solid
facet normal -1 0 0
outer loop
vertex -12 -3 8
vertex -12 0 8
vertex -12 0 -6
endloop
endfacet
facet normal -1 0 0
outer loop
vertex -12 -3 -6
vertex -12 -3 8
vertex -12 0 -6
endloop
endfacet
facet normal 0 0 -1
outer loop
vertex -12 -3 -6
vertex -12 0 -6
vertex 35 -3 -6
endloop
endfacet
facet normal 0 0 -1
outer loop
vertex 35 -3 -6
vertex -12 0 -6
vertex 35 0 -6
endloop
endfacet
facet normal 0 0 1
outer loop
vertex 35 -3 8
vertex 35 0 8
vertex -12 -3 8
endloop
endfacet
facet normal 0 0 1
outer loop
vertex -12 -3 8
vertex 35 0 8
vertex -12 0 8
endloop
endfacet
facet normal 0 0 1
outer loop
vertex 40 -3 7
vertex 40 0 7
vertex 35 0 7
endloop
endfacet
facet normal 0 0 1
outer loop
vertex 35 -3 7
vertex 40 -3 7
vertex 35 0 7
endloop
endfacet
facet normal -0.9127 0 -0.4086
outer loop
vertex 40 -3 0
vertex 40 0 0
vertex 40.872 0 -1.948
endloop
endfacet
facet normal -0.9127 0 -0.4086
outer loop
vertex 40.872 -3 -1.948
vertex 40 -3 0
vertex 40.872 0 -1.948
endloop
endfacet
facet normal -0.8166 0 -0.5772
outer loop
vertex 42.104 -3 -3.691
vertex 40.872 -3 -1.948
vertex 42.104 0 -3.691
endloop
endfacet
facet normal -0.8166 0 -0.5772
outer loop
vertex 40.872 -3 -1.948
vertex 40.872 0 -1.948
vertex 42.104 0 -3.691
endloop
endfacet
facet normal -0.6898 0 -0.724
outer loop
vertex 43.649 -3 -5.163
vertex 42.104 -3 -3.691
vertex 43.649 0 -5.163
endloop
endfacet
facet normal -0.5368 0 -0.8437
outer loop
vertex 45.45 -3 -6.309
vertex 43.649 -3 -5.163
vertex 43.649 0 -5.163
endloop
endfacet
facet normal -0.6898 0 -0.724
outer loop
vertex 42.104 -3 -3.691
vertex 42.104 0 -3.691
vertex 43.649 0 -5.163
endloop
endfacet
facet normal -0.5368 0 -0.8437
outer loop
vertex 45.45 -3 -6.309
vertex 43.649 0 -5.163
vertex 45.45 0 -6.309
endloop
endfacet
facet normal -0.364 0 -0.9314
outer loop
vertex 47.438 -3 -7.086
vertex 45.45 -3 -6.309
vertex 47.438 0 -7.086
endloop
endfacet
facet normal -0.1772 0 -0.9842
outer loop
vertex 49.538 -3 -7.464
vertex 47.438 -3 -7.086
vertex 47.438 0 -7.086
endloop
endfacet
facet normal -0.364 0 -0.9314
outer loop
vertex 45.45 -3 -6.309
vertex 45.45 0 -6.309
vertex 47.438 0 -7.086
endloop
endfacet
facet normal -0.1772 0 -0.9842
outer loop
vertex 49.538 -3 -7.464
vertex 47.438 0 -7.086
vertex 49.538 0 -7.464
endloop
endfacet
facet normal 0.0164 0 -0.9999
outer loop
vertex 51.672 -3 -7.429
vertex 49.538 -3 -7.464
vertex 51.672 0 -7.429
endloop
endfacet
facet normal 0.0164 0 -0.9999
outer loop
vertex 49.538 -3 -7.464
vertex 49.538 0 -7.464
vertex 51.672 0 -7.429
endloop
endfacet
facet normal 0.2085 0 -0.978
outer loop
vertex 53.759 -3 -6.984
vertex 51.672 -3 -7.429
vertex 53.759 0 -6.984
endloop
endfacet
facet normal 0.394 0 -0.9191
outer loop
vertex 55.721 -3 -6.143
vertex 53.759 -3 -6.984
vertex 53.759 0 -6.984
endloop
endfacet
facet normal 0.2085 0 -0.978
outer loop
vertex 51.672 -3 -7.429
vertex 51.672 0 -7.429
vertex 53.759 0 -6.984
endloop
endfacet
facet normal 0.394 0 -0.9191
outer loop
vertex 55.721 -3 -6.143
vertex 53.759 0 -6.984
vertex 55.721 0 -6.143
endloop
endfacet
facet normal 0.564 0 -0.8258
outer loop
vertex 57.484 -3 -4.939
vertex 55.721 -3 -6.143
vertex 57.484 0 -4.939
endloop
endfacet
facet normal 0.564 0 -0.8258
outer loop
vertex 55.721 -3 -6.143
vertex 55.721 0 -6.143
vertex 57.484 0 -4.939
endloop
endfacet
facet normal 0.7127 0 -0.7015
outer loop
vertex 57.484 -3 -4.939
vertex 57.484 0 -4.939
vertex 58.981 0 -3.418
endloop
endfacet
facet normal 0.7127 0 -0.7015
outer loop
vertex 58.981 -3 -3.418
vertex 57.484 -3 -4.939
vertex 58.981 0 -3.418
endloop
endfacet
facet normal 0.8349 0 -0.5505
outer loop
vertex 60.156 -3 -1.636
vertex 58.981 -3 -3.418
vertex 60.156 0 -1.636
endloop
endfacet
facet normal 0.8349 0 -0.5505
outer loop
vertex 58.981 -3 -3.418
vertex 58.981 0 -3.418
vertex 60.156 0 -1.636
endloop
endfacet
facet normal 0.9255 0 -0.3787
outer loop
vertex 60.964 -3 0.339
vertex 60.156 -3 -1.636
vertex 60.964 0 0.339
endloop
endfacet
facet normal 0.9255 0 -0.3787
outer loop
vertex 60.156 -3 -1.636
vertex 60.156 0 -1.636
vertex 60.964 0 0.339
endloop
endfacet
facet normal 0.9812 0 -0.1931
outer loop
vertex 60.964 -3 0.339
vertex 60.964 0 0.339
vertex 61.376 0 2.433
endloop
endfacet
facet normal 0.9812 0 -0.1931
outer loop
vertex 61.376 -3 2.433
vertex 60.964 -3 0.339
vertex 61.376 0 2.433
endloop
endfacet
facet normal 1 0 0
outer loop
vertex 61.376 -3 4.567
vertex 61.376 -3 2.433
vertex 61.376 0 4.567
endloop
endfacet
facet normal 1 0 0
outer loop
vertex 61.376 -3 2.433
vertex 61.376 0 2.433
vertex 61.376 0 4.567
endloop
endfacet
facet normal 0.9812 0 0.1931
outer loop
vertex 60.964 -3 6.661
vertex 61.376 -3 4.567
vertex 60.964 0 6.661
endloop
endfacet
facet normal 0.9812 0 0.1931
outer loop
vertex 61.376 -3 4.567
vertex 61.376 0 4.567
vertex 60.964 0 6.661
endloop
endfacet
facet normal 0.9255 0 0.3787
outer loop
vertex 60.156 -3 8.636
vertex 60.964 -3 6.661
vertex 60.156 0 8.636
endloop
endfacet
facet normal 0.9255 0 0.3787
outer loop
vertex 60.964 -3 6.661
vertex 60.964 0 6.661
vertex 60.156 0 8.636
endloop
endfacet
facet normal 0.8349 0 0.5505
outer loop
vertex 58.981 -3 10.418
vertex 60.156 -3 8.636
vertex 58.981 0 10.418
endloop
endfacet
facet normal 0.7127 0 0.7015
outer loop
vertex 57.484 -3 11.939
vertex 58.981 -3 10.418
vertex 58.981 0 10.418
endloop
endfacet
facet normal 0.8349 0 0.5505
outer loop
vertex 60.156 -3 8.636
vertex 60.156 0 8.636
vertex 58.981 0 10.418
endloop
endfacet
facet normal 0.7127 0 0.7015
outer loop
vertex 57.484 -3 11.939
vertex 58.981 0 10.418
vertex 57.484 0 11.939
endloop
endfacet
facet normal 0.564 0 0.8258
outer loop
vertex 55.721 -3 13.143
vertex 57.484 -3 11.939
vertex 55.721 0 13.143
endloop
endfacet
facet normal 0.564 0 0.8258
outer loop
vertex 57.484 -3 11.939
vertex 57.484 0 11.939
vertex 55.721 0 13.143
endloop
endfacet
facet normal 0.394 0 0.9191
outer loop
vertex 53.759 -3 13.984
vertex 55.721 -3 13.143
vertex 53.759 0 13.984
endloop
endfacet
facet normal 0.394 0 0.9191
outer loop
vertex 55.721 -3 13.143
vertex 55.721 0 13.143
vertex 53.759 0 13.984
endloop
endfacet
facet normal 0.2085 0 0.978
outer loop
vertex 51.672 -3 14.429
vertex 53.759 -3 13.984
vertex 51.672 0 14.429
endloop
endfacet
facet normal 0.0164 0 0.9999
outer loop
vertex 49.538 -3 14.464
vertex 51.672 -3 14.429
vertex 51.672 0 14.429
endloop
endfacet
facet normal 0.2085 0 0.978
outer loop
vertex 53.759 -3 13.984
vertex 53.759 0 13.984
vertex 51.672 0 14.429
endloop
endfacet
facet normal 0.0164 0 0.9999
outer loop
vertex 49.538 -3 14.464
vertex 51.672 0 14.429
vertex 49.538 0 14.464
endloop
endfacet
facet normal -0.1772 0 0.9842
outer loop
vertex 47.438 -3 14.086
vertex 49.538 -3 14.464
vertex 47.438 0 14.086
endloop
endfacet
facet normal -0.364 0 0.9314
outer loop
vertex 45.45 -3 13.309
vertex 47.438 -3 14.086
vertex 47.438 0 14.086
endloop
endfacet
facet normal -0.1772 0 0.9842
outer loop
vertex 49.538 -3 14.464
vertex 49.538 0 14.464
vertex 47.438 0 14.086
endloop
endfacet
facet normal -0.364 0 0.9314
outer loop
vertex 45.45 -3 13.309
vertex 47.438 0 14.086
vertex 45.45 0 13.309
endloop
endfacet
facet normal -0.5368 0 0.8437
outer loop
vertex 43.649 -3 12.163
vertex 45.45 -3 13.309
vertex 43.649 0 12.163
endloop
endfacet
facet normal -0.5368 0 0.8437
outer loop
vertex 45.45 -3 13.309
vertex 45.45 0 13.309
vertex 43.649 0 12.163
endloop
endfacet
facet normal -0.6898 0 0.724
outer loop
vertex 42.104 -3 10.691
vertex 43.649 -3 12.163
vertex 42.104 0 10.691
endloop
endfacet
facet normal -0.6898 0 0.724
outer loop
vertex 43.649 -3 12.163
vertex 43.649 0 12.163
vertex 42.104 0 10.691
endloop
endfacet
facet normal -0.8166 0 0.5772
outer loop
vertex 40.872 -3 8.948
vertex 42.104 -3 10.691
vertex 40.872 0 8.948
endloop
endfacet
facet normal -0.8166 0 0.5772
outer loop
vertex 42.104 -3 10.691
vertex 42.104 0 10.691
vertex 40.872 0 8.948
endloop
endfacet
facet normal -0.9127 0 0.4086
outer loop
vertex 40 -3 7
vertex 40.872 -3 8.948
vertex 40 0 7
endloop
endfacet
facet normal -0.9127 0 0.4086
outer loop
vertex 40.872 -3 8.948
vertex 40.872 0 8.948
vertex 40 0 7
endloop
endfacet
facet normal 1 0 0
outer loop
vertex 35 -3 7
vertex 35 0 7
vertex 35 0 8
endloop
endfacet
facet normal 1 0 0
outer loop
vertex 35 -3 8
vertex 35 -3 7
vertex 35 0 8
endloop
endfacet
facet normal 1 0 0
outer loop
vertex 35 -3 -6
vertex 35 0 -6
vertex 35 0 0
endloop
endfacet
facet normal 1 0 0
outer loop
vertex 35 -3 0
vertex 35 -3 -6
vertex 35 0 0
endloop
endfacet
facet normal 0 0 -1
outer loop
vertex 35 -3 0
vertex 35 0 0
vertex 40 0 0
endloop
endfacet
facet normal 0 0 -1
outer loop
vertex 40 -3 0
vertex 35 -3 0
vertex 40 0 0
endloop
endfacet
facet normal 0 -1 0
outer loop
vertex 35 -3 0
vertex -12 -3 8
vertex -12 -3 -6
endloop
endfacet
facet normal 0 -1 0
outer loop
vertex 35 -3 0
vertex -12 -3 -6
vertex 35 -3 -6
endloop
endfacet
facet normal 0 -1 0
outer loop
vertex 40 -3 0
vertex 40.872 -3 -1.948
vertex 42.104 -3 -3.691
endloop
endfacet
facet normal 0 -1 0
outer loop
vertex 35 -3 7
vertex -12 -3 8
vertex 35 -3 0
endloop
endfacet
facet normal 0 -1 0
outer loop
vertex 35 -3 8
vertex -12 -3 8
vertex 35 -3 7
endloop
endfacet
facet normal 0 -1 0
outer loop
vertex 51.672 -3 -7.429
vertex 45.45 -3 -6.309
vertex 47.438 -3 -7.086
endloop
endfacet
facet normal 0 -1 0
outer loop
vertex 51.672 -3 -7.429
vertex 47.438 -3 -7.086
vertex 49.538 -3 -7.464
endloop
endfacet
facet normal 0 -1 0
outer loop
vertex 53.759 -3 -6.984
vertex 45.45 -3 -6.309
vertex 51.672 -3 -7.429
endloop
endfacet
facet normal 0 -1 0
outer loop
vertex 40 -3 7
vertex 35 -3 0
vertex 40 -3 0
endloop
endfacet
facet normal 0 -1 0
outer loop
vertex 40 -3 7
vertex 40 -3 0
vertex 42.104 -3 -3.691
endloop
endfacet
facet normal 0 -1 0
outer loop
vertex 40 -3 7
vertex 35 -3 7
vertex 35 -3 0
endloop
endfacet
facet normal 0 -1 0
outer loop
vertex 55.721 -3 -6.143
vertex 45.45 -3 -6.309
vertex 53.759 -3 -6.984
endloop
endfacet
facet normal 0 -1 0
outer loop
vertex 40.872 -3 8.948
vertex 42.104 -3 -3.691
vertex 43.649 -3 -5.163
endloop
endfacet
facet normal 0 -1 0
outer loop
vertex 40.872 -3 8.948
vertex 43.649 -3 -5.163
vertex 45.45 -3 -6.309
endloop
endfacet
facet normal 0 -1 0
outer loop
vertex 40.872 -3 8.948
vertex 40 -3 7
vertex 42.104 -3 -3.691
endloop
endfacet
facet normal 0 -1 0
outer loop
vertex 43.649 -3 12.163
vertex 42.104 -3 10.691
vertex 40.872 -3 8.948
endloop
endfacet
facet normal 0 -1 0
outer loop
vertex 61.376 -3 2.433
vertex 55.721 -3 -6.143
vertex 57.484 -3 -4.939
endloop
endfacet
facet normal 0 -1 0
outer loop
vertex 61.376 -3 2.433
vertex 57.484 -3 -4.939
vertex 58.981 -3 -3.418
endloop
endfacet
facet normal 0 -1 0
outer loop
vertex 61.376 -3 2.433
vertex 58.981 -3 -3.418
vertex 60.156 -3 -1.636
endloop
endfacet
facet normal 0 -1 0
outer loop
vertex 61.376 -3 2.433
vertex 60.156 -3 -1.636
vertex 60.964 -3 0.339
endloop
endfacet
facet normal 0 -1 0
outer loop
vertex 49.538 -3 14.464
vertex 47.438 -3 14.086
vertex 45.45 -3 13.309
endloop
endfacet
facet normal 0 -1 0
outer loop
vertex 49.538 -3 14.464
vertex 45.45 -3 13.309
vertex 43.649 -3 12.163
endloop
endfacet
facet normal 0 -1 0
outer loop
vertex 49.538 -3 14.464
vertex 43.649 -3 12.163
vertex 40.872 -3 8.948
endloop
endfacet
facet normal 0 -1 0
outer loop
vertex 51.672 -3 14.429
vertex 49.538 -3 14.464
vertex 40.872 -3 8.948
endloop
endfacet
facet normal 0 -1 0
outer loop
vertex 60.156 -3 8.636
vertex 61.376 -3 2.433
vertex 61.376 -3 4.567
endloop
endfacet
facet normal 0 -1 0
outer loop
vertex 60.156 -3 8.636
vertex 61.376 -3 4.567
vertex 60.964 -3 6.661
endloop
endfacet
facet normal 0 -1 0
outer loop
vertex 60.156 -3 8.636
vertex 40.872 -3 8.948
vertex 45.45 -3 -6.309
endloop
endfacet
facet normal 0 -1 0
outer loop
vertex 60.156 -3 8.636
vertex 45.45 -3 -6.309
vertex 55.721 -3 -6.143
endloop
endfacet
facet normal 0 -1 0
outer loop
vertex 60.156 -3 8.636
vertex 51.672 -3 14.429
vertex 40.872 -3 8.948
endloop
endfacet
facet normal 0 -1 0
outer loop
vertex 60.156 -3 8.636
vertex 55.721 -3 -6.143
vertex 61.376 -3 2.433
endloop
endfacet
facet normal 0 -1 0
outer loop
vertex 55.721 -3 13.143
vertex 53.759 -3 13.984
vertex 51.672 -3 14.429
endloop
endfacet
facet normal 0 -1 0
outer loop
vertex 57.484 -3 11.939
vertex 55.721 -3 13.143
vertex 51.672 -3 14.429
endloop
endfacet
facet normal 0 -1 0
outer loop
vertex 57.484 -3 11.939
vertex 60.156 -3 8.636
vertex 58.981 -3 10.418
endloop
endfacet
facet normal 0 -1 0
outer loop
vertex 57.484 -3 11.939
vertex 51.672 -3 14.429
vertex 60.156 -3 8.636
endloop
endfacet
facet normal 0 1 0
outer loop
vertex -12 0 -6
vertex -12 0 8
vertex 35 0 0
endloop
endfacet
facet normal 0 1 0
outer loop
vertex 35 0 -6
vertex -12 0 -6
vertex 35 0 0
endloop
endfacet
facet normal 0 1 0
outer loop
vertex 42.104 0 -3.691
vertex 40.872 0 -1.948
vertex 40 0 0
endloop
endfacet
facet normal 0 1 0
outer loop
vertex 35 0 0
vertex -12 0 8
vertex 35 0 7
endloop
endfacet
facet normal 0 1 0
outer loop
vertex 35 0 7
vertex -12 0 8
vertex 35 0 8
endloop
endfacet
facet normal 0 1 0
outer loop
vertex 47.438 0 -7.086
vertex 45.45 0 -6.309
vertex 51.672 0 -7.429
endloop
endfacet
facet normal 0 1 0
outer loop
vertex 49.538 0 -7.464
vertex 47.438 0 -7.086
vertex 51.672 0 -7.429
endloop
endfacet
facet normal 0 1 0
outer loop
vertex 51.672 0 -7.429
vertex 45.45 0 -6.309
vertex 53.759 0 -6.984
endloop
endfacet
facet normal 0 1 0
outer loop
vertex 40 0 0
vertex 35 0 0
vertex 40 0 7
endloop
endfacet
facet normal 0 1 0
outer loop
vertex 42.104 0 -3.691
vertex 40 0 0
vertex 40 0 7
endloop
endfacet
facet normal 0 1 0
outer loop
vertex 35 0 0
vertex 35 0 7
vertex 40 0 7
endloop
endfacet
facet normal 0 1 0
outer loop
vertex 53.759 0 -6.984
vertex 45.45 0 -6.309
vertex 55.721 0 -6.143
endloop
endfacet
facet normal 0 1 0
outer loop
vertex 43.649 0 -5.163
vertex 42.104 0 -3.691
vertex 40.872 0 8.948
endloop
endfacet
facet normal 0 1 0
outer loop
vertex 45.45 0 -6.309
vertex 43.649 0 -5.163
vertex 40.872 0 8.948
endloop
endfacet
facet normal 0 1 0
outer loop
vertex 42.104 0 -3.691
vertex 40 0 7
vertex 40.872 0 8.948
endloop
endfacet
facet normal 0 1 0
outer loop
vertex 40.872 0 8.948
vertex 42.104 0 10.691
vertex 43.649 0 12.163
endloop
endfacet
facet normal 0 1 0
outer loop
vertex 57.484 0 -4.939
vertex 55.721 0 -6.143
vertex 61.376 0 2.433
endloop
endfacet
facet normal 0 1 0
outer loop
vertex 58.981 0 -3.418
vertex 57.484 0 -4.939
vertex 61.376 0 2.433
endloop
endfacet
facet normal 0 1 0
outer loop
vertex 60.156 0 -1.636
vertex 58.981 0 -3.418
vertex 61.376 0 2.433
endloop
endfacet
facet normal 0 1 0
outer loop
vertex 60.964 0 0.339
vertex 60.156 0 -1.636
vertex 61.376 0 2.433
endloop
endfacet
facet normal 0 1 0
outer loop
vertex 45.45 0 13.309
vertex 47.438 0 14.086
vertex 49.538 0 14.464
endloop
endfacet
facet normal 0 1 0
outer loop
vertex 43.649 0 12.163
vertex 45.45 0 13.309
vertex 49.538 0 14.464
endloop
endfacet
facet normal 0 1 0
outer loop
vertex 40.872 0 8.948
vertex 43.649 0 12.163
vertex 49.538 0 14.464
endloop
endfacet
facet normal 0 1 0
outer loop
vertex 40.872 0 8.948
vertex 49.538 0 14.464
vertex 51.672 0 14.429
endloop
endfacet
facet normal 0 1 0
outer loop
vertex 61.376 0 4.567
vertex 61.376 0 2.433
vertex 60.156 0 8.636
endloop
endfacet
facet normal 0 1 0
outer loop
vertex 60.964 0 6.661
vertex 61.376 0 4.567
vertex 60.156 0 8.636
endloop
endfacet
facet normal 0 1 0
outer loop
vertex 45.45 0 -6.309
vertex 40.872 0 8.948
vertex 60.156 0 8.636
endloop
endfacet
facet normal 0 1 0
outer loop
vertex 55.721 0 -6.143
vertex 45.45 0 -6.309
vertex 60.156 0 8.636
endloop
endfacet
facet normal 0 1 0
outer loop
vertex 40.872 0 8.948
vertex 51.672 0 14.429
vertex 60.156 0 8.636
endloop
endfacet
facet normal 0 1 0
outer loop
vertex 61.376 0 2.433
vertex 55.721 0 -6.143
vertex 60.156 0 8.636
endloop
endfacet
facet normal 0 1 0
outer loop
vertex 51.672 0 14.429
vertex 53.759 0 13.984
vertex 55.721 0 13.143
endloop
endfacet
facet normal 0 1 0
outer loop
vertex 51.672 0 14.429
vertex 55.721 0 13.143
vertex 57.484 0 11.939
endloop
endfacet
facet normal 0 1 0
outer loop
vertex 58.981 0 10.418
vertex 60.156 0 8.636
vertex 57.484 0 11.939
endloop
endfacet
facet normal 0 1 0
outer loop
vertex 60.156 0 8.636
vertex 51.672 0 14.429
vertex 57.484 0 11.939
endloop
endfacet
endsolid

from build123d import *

# Parameters (mm, degrees)
F0_W     = 5
F0_H     = 7
F0_R     = 3
F1_DEPTH = 3


# Not quite as in the source:
# - a feature names something its author has since deleted; it is built from what else it names


with BuildPart() as f1:
    # F0 (on Front) → F1 (new body)
    with BuildSketch(Plane.XZ):
        Polygon((1.3333333333, 0), (0, 0), (0, 7), (-10, 2.5), (-10, -2), (-2, -2), align=None)
        Polygon((0, 7), (0, 0), (1.3333333333, 0), (8, 4), (13, 4), (14.2307692308, 0), (32, 0), (35, 0), (35, 7), align=None)
        Polygon((32, 0), (14.2307692308, 0), (15, -2.5), (11.75, -3.5), (15, -5), align=None)
        with Locations((37.5, 3.5)):
            Rectangle(F0_W, F0_H)
        with BuildLine():
            ThreePointArc((40, 0), (61.4283268073, 3.5), (40, 7))
            Line((40, 7), (40, 0))
        make_face()
        with Locations((57.4283268073, 3.5)):
            Circle(F0_R, mode=Mode.SUBTRACT)
        Polygon((8, 4), (1.3333333333, 0), (14.2307692308, 0), (13, 4), align=None)
        Polygon((14.2307692308, 0), (1.3333333333, 0), (-2, -2), (-10, -2), (-10, 2.5), (0, 7), (35, 7), (35, 8), (-12, 8), (-12, -6), (35, -6), (35, 0), (32, 0), (15, -5), (11.75, -3.5), (15, -2.5), align=None)
        with Locations((57.4283268073, 3.5)):
            Circle(F0_R)
    extrude(amount=F1_DEPTH)


solid = f1.part
